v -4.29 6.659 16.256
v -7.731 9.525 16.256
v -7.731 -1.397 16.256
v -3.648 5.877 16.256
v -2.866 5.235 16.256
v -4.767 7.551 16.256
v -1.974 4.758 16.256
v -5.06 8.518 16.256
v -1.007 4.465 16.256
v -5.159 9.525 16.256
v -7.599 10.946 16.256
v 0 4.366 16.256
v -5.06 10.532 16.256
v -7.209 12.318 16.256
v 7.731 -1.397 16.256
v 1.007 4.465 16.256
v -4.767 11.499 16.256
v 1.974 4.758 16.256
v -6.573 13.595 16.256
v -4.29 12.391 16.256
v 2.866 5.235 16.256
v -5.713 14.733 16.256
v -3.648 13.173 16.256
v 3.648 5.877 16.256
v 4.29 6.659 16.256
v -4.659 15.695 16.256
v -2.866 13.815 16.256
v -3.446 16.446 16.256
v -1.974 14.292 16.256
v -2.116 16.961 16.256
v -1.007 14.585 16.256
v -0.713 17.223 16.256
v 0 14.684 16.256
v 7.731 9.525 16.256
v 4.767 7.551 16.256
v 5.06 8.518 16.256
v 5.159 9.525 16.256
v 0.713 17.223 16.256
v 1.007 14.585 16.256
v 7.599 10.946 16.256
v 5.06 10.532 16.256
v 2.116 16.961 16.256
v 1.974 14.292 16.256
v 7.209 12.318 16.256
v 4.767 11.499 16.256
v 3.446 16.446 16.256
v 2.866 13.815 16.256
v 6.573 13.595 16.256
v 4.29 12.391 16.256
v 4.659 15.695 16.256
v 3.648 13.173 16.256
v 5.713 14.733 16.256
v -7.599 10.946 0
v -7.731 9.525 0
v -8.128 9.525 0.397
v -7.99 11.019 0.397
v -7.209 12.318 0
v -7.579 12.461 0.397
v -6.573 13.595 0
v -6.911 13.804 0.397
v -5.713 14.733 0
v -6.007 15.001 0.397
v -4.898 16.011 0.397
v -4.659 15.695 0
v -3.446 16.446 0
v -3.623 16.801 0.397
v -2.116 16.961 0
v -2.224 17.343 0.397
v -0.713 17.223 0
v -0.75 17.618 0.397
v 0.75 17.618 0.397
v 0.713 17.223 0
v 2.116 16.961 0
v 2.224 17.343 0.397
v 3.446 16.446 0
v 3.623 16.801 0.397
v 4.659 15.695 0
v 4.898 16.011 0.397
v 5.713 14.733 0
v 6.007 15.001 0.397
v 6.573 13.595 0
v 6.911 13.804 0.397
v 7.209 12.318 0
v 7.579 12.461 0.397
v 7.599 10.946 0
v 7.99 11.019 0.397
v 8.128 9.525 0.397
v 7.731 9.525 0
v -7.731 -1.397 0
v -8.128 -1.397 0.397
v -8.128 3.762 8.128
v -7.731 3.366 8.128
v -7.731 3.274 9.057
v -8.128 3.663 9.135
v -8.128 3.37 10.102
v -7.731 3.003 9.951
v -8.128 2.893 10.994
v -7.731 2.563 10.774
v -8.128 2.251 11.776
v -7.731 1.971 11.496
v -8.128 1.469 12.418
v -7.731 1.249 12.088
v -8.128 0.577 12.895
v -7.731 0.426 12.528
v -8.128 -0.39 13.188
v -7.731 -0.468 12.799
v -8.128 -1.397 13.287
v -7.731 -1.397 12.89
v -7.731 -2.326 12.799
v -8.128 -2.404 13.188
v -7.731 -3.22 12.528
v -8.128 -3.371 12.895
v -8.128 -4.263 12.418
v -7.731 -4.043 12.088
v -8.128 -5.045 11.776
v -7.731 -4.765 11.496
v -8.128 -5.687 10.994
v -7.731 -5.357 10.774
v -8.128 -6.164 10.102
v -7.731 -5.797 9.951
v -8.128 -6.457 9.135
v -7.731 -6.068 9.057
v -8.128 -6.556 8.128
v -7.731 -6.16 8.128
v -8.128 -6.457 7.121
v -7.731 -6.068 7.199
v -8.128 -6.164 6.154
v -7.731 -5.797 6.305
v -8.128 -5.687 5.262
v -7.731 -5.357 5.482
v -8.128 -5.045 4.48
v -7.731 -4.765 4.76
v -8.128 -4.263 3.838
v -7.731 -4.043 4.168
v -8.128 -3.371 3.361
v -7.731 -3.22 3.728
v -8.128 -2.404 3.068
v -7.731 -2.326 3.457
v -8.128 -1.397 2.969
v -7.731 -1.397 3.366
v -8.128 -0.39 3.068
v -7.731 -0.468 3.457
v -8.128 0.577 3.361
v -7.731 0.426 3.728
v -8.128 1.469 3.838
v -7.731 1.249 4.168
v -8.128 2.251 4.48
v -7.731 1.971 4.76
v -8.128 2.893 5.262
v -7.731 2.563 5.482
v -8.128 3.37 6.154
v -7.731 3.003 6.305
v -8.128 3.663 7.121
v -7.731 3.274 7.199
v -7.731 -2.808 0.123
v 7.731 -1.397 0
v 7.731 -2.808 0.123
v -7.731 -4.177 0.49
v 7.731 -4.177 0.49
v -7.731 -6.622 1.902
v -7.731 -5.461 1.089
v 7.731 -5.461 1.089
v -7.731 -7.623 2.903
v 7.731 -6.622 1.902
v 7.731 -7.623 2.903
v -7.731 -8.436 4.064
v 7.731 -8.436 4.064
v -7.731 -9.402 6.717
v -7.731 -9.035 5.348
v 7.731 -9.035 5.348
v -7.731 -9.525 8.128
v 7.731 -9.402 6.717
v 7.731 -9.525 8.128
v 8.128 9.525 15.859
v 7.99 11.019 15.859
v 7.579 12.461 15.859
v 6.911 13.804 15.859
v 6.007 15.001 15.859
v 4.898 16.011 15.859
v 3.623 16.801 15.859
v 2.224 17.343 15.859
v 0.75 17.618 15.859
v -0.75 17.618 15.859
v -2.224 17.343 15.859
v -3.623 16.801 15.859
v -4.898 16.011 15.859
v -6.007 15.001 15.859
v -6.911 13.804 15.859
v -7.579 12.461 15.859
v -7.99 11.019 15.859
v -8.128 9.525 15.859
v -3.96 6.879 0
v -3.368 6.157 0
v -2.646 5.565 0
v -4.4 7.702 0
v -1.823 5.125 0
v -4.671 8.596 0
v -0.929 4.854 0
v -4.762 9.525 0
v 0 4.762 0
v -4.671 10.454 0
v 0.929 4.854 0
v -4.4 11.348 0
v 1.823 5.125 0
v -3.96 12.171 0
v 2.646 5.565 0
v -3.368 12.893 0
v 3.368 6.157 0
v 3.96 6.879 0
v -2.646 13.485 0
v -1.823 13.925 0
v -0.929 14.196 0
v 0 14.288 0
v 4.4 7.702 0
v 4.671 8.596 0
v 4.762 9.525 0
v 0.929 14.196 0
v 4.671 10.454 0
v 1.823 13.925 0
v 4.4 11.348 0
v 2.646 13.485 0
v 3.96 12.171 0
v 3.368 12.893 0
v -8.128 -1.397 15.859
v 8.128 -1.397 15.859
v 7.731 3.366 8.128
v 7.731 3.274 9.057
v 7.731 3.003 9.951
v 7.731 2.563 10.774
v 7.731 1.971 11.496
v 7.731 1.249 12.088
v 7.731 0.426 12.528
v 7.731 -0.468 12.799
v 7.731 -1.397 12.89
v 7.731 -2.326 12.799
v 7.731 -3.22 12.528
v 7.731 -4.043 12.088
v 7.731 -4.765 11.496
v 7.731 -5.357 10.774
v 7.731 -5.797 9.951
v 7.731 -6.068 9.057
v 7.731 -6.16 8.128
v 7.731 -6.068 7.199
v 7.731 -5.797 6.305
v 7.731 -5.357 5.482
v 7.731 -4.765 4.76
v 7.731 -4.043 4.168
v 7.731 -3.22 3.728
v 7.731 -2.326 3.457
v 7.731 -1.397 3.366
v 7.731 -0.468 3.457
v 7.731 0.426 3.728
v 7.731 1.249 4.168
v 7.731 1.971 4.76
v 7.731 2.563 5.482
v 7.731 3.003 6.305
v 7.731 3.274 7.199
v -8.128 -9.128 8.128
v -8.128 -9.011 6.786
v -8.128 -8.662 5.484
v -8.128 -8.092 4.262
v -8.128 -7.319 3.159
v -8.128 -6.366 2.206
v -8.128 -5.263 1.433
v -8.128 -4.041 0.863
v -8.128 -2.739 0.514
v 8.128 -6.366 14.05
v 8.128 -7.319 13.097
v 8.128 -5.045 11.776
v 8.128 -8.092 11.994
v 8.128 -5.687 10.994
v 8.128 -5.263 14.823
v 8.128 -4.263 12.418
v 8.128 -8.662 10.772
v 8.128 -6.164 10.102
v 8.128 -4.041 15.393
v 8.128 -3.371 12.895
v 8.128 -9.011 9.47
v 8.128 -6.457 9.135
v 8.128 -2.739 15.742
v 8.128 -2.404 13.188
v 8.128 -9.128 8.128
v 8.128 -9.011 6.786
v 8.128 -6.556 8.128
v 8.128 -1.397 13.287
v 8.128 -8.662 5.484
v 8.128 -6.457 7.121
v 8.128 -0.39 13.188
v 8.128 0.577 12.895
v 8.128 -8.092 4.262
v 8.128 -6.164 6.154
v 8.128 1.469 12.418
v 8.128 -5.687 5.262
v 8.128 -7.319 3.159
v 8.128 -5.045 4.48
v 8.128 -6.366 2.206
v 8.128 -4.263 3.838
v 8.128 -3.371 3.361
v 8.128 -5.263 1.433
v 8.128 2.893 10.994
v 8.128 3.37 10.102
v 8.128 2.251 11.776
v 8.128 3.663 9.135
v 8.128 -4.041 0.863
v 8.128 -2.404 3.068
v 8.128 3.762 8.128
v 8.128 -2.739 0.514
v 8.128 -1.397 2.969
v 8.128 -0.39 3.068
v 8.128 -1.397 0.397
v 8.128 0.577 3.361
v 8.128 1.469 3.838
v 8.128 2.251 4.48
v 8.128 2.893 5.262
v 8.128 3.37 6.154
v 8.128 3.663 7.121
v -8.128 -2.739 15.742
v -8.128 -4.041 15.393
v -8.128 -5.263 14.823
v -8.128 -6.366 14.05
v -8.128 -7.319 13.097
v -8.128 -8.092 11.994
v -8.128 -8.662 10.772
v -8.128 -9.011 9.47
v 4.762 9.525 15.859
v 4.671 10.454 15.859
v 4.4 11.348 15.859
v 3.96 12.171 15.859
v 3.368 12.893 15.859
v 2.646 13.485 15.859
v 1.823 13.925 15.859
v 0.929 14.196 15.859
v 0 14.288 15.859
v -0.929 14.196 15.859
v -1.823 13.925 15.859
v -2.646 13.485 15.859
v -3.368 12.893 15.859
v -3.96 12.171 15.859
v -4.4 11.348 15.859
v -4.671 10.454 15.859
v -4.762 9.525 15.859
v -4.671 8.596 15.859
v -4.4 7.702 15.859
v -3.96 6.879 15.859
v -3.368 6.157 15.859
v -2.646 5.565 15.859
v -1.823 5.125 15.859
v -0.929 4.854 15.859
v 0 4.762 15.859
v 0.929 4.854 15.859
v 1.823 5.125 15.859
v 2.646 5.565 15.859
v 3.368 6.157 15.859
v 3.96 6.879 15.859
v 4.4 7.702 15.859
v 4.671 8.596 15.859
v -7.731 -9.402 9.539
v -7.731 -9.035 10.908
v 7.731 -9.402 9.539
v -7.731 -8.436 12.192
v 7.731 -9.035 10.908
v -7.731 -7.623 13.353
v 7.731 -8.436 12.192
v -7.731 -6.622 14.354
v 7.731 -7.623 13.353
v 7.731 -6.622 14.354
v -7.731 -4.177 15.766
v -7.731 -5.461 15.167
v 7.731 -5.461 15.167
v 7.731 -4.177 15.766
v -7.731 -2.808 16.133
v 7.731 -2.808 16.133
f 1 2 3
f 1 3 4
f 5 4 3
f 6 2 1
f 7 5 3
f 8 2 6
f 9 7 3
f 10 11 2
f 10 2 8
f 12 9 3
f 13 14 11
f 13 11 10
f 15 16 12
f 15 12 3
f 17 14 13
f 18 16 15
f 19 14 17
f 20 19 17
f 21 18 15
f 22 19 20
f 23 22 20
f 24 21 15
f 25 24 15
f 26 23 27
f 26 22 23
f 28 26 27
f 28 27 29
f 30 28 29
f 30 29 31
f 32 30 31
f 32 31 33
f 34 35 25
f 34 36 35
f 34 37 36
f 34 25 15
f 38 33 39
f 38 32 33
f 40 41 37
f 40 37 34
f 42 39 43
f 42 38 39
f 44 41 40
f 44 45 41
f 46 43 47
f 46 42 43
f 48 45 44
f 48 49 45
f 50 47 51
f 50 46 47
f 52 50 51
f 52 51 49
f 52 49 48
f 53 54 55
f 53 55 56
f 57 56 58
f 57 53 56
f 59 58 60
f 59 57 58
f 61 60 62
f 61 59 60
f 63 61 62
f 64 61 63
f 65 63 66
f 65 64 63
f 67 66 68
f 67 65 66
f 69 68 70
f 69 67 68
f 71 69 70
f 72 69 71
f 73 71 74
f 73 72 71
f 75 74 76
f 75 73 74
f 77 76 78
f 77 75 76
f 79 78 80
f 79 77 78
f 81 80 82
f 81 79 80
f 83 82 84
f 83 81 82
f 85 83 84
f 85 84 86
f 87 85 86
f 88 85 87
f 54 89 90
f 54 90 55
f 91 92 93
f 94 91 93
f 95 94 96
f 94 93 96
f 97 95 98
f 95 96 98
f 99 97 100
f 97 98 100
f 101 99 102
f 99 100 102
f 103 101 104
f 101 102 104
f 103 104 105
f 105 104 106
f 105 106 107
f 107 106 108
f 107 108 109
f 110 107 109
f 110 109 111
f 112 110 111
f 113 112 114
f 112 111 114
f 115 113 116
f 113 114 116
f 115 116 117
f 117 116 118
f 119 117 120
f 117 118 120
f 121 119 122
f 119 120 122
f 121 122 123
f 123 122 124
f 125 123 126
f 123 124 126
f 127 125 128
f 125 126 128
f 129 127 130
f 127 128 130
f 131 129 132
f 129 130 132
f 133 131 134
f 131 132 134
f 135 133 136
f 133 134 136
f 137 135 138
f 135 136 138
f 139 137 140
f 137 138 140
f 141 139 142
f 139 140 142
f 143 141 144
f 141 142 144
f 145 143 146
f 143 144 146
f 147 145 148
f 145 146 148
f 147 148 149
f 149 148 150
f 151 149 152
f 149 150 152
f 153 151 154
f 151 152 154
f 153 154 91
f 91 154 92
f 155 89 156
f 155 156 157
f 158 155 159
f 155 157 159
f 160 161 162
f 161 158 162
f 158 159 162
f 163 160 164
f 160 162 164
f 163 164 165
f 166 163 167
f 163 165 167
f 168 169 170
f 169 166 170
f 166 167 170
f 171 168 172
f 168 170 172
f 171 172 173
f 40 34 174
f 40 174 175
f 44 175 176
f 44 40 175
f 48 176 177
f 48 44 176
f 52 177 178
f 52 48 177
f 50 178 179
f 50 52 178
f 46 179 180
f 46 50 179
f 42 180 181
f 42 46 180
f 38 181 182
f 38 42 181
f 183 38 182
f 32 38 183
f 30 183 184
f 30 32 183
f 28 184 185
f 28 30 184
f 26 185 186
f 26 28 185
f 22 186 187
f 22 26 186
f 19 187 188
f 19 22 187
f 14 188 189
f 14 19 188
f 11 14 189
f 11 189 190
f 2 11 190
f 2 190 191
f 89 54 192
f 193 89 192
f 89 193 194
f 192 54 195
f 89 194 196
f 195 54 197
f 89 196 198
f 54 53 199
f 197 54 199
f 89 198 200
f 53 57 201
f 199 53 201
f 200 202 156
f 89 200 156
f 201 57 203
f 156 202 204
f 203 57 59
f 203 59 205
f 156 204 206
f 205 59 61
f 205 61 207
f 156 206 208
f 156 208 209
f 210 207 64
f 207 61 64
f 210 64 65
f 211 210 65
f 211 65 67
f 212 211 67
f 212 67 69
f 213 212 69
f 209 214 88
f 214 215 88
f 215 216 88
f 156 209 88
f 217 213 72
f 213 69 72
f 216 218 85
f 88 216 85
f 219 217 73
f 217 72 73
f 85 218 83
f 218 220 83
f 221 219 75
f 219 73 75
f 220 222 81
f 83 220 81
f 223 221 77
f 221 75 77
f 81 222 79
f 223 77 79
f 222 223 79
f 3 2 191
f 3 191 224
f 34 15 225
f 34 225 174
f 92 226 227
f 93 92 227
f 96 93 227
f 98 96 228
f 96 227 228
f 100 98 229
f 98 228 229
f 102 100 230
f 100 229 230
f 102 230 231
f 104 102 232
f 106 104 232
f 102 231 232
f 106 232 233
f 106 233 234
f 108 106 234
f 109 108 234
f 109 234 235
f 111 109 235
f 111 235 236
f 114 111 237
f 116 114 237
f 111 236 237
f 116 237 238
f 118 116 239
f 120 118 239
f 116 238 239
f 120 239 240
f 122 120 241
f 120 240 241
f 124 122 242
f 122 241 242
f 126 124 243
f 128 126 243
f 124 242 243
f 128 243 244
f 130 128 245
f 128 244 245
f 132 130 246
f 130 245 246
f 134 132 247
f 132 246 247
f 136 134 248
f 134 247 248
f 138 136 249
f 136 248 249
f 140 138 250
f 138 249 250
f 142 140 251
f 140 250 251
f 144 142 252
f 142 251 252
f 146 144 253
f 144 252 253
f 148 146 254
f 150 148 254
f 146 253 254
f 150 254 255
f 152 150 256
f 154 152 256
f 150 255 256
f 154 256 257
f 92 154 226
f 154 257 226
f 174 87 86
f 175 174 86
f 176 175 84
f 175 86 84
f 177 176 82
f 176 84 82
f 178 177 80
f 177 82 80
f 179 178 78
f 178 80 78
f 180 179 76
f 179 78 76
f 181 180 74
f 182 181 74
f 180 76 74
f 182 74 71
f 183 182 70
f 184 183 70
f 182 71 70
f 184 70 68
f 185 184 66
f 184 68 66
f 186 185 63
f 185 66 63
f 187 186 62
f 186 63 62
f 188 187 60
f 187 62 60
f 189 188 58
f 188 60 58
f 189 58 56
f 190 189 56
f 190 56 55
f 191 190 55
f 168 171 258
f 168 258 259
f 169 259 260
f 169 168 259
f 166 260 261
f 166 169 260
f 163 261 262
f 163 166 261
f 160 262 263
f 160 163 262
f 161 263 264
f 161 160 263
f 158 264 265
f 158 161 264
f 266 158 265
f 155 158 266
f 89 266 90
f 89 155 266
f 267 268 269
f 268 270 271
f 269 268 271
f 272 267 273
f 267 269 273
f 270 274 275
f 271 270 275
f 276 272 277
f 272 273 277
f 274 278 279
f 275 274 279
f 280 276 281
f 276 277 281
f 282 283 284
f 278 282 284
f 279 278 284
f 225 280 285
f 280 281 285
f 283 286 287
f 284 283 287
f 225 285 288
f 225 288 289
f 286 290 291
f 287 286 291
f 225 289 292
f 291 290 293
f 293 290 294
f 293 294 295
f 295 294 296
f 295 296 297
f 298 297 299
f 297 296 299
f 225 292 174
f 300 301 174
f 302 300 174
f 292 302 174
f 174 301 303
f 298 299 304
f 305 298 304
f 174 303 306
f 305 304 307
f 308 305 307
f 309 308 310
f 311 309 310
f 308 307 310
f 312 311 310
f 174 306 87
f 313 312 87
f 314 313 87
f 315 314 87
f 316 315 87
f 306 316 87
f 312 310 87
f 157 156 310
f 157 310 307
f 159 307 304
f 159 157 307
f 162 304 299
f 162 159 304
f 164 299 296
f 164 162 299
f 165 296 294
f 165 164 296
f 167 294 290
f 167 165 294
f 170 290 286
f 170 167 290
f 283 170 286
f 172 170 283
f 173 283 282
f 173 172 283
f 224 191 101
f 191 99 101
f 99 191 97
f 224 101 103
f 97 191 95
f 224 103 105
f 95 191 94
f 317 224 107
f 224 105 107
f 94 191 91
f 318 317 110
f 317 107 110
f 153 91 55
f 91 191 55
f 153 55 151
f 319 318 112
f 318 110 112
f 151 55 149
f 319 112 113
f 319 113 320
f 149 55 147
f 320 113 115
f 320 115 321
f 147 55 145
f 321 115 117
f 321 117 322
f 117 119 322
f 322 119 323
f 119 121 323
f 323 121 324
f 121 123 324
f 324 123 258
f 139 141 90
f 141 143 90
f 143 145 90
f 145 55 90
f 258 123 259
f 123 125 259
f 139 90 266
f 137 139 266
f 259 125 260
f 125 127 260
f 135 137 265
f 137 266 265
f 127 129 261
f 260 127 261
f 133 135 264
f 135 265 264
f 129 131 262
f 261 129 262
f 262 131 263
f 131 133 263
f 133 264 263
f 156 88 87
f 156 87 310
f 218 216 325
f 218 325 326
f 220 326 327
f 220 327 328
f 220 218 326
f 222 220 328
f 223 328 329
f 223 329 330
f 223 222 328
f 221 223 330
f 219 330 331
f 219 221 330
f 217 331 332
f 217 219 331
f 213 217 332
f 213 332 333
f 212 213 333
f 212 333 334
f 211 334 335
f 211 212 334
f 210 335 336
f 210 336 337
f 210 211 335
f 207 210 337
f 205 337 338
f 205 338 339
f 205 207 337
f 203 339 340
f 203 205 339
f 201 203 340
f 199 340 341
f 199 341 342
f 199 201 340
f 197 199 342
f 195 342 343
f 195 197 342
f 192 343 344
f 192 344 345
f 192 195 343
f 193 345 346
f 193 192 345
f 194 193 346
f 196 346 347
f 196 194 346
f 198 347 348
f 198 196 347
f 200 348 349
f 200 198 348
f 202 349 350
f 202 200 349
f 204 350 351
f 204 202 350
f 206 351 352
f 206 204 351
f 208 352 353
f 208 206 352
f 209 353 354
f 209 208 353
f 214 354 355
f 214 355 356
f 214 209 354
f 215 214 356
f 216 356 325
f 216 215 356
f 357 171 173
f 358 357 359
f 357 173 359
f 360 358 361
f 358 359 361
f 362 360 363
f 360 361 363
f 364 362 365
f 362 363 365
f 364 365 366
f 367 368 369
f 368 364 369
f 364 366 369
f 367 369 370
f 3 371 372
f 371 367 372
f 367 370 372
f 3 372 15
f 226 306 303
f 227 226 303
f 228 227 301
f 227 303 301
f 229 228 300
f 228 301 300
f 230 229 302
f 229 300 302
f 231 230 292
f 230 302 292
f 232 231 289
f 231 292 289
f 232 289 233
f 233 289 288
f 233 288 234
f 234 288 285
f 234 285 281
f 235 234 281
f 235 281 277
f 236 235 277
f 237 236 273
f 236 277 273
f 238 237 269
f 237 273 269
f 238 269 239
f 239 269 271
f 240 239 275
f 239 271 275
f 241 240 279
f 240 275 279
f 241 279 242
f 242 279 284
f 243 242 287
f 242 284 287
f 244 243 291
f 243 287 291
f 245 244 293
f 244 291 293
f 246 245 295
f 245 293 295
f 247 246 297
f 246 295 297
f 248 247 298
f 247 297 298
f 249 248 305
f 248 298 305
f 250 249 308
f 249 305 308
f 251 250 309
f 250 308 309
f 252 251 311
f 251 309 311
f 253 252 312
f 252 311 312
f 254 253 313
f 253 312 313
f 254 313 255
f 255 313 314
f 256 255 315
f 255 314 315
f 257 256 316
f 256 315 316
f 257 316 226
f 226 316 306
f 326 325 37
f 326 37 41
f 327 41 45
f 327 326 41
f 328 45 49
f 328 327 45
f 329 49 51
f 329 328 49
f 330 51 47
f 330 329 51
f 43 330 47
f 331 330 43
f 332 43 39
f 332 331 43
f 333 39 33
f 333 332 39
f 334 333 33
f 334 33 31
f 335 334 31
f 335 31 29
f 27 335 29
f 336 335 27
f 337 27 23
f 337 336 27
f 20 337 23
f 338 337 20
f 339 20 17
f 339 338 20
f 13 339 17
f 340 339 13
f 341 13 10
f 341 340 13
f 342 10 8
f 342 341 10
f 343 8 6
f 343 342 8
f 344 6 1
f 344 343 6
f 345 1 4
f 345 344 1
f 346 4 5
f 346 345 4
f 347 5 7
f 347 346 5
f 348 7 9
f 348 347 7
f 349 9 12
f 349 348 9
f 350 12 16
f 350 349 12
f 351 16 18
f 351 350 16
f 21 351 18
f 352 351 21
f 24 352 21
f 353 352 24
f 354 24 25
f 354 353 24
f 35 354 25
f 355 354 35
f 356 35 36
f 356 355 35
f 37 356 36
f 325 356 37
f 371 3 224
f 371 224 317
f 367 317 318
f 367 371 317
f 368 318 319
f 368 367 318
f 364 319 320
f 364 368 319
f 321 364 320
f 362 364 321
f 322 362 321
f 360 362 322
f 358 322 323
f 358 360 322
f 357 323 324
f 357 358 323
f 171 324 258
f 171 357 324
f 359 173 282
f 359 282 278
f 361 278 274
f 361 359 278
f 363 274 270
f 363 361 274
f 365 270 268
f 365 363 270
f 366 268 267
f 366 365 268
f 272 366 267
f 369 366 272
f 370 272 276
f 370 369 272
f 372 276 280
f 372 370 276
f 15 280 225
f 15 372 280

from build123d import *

# Parameters (mm, degrees)
SKETCH1_R           = 4.7625
BOSS_EXTRUDE1_DEPTH = 16.256
SKETCH2_R           = 4.7625
CUT_EXTRUDE1_DEPTH  = 16.256
CHAMFER1_SIZE       = 0.396875


with BuildPart() as part:
    # Sketch1 → Boss-Extrude1 (new body)
    with BuildSketch(Plane.XY):
        with BuildLine():
            Line((-8.128, 9.525), (-8.128, -9.525))
            Line((-8.128, -9.525), (8.128, -9.525))
            Line((8.128, -9.525), (8.128, 9.525))
            ThreePointArc((8.128, 9.525), (0, 17.653), (-8.128, 9.525))
        make_face()
        with Locations((0, 9.525)):
            Circle(SKETCH1_R, mode=Mode.SUBTRACT)
    extrude(amount=BOSS_EXTRUDE1_DEPTH)

    # Sketch2 → Cut-Extrude1 (cut)
    with BuildSketch(Plane(origin=(8.128, 0, 0), x_dir=(0, 0, -1), z_dir=(1, 0, 0))):
        with BuildLine():
            ThreePointArc((0, -1.397), (-2.380636089, -7.144363924), (-8.128000019, -9.525))
            Line((-8.128000019, -9.525), (0, -9.525))
            Line((0, -9.525), (0, -1.397))
        make_face()
        with BuildLine():
            ThreePointArc((-8.128000019, -9.525), (-13.875363924, -7.144363911), (-16.256, -1.397))
            Line((-16.256, -1.397), (-16.256, -9.525))
            Line((-16.256, -9.525), (-8.128000019, -9.525))
        make_face()
        with Locations(Location((-8.128, -1.397, 0), (0, 0, 90))):
            Circle(SKETCH2_R)
    extrude(amount=-CUT_EXTRUDE1_DEPTH, mode=Mode.SUBTRACT)

    # Chamfer1
    chamfer1_edges = [part.edges().sort_by_distance(p)[0] for p in [
        (-4.7625, 9.525, 16.256),
        (-8.128, 4.064, 16.256),
        (8.128, 4.064, 16.256),
        (8.128, -9.525, 8.128),
        (-8.128, -9.525, 8.128),
        (8.128, 4.064, 0),
        (8.128, -6.1595, 8.128),
        (-8.128, -6.1595, 8.128),
        (-8.128, 4.064, 0),
        (0, 17.653, 0),
        (0, 17.653, 16.256),
    ]]
    chamfer(chamfer1_edges, length=CHAMFER1_SIZE)


solid = part.part
